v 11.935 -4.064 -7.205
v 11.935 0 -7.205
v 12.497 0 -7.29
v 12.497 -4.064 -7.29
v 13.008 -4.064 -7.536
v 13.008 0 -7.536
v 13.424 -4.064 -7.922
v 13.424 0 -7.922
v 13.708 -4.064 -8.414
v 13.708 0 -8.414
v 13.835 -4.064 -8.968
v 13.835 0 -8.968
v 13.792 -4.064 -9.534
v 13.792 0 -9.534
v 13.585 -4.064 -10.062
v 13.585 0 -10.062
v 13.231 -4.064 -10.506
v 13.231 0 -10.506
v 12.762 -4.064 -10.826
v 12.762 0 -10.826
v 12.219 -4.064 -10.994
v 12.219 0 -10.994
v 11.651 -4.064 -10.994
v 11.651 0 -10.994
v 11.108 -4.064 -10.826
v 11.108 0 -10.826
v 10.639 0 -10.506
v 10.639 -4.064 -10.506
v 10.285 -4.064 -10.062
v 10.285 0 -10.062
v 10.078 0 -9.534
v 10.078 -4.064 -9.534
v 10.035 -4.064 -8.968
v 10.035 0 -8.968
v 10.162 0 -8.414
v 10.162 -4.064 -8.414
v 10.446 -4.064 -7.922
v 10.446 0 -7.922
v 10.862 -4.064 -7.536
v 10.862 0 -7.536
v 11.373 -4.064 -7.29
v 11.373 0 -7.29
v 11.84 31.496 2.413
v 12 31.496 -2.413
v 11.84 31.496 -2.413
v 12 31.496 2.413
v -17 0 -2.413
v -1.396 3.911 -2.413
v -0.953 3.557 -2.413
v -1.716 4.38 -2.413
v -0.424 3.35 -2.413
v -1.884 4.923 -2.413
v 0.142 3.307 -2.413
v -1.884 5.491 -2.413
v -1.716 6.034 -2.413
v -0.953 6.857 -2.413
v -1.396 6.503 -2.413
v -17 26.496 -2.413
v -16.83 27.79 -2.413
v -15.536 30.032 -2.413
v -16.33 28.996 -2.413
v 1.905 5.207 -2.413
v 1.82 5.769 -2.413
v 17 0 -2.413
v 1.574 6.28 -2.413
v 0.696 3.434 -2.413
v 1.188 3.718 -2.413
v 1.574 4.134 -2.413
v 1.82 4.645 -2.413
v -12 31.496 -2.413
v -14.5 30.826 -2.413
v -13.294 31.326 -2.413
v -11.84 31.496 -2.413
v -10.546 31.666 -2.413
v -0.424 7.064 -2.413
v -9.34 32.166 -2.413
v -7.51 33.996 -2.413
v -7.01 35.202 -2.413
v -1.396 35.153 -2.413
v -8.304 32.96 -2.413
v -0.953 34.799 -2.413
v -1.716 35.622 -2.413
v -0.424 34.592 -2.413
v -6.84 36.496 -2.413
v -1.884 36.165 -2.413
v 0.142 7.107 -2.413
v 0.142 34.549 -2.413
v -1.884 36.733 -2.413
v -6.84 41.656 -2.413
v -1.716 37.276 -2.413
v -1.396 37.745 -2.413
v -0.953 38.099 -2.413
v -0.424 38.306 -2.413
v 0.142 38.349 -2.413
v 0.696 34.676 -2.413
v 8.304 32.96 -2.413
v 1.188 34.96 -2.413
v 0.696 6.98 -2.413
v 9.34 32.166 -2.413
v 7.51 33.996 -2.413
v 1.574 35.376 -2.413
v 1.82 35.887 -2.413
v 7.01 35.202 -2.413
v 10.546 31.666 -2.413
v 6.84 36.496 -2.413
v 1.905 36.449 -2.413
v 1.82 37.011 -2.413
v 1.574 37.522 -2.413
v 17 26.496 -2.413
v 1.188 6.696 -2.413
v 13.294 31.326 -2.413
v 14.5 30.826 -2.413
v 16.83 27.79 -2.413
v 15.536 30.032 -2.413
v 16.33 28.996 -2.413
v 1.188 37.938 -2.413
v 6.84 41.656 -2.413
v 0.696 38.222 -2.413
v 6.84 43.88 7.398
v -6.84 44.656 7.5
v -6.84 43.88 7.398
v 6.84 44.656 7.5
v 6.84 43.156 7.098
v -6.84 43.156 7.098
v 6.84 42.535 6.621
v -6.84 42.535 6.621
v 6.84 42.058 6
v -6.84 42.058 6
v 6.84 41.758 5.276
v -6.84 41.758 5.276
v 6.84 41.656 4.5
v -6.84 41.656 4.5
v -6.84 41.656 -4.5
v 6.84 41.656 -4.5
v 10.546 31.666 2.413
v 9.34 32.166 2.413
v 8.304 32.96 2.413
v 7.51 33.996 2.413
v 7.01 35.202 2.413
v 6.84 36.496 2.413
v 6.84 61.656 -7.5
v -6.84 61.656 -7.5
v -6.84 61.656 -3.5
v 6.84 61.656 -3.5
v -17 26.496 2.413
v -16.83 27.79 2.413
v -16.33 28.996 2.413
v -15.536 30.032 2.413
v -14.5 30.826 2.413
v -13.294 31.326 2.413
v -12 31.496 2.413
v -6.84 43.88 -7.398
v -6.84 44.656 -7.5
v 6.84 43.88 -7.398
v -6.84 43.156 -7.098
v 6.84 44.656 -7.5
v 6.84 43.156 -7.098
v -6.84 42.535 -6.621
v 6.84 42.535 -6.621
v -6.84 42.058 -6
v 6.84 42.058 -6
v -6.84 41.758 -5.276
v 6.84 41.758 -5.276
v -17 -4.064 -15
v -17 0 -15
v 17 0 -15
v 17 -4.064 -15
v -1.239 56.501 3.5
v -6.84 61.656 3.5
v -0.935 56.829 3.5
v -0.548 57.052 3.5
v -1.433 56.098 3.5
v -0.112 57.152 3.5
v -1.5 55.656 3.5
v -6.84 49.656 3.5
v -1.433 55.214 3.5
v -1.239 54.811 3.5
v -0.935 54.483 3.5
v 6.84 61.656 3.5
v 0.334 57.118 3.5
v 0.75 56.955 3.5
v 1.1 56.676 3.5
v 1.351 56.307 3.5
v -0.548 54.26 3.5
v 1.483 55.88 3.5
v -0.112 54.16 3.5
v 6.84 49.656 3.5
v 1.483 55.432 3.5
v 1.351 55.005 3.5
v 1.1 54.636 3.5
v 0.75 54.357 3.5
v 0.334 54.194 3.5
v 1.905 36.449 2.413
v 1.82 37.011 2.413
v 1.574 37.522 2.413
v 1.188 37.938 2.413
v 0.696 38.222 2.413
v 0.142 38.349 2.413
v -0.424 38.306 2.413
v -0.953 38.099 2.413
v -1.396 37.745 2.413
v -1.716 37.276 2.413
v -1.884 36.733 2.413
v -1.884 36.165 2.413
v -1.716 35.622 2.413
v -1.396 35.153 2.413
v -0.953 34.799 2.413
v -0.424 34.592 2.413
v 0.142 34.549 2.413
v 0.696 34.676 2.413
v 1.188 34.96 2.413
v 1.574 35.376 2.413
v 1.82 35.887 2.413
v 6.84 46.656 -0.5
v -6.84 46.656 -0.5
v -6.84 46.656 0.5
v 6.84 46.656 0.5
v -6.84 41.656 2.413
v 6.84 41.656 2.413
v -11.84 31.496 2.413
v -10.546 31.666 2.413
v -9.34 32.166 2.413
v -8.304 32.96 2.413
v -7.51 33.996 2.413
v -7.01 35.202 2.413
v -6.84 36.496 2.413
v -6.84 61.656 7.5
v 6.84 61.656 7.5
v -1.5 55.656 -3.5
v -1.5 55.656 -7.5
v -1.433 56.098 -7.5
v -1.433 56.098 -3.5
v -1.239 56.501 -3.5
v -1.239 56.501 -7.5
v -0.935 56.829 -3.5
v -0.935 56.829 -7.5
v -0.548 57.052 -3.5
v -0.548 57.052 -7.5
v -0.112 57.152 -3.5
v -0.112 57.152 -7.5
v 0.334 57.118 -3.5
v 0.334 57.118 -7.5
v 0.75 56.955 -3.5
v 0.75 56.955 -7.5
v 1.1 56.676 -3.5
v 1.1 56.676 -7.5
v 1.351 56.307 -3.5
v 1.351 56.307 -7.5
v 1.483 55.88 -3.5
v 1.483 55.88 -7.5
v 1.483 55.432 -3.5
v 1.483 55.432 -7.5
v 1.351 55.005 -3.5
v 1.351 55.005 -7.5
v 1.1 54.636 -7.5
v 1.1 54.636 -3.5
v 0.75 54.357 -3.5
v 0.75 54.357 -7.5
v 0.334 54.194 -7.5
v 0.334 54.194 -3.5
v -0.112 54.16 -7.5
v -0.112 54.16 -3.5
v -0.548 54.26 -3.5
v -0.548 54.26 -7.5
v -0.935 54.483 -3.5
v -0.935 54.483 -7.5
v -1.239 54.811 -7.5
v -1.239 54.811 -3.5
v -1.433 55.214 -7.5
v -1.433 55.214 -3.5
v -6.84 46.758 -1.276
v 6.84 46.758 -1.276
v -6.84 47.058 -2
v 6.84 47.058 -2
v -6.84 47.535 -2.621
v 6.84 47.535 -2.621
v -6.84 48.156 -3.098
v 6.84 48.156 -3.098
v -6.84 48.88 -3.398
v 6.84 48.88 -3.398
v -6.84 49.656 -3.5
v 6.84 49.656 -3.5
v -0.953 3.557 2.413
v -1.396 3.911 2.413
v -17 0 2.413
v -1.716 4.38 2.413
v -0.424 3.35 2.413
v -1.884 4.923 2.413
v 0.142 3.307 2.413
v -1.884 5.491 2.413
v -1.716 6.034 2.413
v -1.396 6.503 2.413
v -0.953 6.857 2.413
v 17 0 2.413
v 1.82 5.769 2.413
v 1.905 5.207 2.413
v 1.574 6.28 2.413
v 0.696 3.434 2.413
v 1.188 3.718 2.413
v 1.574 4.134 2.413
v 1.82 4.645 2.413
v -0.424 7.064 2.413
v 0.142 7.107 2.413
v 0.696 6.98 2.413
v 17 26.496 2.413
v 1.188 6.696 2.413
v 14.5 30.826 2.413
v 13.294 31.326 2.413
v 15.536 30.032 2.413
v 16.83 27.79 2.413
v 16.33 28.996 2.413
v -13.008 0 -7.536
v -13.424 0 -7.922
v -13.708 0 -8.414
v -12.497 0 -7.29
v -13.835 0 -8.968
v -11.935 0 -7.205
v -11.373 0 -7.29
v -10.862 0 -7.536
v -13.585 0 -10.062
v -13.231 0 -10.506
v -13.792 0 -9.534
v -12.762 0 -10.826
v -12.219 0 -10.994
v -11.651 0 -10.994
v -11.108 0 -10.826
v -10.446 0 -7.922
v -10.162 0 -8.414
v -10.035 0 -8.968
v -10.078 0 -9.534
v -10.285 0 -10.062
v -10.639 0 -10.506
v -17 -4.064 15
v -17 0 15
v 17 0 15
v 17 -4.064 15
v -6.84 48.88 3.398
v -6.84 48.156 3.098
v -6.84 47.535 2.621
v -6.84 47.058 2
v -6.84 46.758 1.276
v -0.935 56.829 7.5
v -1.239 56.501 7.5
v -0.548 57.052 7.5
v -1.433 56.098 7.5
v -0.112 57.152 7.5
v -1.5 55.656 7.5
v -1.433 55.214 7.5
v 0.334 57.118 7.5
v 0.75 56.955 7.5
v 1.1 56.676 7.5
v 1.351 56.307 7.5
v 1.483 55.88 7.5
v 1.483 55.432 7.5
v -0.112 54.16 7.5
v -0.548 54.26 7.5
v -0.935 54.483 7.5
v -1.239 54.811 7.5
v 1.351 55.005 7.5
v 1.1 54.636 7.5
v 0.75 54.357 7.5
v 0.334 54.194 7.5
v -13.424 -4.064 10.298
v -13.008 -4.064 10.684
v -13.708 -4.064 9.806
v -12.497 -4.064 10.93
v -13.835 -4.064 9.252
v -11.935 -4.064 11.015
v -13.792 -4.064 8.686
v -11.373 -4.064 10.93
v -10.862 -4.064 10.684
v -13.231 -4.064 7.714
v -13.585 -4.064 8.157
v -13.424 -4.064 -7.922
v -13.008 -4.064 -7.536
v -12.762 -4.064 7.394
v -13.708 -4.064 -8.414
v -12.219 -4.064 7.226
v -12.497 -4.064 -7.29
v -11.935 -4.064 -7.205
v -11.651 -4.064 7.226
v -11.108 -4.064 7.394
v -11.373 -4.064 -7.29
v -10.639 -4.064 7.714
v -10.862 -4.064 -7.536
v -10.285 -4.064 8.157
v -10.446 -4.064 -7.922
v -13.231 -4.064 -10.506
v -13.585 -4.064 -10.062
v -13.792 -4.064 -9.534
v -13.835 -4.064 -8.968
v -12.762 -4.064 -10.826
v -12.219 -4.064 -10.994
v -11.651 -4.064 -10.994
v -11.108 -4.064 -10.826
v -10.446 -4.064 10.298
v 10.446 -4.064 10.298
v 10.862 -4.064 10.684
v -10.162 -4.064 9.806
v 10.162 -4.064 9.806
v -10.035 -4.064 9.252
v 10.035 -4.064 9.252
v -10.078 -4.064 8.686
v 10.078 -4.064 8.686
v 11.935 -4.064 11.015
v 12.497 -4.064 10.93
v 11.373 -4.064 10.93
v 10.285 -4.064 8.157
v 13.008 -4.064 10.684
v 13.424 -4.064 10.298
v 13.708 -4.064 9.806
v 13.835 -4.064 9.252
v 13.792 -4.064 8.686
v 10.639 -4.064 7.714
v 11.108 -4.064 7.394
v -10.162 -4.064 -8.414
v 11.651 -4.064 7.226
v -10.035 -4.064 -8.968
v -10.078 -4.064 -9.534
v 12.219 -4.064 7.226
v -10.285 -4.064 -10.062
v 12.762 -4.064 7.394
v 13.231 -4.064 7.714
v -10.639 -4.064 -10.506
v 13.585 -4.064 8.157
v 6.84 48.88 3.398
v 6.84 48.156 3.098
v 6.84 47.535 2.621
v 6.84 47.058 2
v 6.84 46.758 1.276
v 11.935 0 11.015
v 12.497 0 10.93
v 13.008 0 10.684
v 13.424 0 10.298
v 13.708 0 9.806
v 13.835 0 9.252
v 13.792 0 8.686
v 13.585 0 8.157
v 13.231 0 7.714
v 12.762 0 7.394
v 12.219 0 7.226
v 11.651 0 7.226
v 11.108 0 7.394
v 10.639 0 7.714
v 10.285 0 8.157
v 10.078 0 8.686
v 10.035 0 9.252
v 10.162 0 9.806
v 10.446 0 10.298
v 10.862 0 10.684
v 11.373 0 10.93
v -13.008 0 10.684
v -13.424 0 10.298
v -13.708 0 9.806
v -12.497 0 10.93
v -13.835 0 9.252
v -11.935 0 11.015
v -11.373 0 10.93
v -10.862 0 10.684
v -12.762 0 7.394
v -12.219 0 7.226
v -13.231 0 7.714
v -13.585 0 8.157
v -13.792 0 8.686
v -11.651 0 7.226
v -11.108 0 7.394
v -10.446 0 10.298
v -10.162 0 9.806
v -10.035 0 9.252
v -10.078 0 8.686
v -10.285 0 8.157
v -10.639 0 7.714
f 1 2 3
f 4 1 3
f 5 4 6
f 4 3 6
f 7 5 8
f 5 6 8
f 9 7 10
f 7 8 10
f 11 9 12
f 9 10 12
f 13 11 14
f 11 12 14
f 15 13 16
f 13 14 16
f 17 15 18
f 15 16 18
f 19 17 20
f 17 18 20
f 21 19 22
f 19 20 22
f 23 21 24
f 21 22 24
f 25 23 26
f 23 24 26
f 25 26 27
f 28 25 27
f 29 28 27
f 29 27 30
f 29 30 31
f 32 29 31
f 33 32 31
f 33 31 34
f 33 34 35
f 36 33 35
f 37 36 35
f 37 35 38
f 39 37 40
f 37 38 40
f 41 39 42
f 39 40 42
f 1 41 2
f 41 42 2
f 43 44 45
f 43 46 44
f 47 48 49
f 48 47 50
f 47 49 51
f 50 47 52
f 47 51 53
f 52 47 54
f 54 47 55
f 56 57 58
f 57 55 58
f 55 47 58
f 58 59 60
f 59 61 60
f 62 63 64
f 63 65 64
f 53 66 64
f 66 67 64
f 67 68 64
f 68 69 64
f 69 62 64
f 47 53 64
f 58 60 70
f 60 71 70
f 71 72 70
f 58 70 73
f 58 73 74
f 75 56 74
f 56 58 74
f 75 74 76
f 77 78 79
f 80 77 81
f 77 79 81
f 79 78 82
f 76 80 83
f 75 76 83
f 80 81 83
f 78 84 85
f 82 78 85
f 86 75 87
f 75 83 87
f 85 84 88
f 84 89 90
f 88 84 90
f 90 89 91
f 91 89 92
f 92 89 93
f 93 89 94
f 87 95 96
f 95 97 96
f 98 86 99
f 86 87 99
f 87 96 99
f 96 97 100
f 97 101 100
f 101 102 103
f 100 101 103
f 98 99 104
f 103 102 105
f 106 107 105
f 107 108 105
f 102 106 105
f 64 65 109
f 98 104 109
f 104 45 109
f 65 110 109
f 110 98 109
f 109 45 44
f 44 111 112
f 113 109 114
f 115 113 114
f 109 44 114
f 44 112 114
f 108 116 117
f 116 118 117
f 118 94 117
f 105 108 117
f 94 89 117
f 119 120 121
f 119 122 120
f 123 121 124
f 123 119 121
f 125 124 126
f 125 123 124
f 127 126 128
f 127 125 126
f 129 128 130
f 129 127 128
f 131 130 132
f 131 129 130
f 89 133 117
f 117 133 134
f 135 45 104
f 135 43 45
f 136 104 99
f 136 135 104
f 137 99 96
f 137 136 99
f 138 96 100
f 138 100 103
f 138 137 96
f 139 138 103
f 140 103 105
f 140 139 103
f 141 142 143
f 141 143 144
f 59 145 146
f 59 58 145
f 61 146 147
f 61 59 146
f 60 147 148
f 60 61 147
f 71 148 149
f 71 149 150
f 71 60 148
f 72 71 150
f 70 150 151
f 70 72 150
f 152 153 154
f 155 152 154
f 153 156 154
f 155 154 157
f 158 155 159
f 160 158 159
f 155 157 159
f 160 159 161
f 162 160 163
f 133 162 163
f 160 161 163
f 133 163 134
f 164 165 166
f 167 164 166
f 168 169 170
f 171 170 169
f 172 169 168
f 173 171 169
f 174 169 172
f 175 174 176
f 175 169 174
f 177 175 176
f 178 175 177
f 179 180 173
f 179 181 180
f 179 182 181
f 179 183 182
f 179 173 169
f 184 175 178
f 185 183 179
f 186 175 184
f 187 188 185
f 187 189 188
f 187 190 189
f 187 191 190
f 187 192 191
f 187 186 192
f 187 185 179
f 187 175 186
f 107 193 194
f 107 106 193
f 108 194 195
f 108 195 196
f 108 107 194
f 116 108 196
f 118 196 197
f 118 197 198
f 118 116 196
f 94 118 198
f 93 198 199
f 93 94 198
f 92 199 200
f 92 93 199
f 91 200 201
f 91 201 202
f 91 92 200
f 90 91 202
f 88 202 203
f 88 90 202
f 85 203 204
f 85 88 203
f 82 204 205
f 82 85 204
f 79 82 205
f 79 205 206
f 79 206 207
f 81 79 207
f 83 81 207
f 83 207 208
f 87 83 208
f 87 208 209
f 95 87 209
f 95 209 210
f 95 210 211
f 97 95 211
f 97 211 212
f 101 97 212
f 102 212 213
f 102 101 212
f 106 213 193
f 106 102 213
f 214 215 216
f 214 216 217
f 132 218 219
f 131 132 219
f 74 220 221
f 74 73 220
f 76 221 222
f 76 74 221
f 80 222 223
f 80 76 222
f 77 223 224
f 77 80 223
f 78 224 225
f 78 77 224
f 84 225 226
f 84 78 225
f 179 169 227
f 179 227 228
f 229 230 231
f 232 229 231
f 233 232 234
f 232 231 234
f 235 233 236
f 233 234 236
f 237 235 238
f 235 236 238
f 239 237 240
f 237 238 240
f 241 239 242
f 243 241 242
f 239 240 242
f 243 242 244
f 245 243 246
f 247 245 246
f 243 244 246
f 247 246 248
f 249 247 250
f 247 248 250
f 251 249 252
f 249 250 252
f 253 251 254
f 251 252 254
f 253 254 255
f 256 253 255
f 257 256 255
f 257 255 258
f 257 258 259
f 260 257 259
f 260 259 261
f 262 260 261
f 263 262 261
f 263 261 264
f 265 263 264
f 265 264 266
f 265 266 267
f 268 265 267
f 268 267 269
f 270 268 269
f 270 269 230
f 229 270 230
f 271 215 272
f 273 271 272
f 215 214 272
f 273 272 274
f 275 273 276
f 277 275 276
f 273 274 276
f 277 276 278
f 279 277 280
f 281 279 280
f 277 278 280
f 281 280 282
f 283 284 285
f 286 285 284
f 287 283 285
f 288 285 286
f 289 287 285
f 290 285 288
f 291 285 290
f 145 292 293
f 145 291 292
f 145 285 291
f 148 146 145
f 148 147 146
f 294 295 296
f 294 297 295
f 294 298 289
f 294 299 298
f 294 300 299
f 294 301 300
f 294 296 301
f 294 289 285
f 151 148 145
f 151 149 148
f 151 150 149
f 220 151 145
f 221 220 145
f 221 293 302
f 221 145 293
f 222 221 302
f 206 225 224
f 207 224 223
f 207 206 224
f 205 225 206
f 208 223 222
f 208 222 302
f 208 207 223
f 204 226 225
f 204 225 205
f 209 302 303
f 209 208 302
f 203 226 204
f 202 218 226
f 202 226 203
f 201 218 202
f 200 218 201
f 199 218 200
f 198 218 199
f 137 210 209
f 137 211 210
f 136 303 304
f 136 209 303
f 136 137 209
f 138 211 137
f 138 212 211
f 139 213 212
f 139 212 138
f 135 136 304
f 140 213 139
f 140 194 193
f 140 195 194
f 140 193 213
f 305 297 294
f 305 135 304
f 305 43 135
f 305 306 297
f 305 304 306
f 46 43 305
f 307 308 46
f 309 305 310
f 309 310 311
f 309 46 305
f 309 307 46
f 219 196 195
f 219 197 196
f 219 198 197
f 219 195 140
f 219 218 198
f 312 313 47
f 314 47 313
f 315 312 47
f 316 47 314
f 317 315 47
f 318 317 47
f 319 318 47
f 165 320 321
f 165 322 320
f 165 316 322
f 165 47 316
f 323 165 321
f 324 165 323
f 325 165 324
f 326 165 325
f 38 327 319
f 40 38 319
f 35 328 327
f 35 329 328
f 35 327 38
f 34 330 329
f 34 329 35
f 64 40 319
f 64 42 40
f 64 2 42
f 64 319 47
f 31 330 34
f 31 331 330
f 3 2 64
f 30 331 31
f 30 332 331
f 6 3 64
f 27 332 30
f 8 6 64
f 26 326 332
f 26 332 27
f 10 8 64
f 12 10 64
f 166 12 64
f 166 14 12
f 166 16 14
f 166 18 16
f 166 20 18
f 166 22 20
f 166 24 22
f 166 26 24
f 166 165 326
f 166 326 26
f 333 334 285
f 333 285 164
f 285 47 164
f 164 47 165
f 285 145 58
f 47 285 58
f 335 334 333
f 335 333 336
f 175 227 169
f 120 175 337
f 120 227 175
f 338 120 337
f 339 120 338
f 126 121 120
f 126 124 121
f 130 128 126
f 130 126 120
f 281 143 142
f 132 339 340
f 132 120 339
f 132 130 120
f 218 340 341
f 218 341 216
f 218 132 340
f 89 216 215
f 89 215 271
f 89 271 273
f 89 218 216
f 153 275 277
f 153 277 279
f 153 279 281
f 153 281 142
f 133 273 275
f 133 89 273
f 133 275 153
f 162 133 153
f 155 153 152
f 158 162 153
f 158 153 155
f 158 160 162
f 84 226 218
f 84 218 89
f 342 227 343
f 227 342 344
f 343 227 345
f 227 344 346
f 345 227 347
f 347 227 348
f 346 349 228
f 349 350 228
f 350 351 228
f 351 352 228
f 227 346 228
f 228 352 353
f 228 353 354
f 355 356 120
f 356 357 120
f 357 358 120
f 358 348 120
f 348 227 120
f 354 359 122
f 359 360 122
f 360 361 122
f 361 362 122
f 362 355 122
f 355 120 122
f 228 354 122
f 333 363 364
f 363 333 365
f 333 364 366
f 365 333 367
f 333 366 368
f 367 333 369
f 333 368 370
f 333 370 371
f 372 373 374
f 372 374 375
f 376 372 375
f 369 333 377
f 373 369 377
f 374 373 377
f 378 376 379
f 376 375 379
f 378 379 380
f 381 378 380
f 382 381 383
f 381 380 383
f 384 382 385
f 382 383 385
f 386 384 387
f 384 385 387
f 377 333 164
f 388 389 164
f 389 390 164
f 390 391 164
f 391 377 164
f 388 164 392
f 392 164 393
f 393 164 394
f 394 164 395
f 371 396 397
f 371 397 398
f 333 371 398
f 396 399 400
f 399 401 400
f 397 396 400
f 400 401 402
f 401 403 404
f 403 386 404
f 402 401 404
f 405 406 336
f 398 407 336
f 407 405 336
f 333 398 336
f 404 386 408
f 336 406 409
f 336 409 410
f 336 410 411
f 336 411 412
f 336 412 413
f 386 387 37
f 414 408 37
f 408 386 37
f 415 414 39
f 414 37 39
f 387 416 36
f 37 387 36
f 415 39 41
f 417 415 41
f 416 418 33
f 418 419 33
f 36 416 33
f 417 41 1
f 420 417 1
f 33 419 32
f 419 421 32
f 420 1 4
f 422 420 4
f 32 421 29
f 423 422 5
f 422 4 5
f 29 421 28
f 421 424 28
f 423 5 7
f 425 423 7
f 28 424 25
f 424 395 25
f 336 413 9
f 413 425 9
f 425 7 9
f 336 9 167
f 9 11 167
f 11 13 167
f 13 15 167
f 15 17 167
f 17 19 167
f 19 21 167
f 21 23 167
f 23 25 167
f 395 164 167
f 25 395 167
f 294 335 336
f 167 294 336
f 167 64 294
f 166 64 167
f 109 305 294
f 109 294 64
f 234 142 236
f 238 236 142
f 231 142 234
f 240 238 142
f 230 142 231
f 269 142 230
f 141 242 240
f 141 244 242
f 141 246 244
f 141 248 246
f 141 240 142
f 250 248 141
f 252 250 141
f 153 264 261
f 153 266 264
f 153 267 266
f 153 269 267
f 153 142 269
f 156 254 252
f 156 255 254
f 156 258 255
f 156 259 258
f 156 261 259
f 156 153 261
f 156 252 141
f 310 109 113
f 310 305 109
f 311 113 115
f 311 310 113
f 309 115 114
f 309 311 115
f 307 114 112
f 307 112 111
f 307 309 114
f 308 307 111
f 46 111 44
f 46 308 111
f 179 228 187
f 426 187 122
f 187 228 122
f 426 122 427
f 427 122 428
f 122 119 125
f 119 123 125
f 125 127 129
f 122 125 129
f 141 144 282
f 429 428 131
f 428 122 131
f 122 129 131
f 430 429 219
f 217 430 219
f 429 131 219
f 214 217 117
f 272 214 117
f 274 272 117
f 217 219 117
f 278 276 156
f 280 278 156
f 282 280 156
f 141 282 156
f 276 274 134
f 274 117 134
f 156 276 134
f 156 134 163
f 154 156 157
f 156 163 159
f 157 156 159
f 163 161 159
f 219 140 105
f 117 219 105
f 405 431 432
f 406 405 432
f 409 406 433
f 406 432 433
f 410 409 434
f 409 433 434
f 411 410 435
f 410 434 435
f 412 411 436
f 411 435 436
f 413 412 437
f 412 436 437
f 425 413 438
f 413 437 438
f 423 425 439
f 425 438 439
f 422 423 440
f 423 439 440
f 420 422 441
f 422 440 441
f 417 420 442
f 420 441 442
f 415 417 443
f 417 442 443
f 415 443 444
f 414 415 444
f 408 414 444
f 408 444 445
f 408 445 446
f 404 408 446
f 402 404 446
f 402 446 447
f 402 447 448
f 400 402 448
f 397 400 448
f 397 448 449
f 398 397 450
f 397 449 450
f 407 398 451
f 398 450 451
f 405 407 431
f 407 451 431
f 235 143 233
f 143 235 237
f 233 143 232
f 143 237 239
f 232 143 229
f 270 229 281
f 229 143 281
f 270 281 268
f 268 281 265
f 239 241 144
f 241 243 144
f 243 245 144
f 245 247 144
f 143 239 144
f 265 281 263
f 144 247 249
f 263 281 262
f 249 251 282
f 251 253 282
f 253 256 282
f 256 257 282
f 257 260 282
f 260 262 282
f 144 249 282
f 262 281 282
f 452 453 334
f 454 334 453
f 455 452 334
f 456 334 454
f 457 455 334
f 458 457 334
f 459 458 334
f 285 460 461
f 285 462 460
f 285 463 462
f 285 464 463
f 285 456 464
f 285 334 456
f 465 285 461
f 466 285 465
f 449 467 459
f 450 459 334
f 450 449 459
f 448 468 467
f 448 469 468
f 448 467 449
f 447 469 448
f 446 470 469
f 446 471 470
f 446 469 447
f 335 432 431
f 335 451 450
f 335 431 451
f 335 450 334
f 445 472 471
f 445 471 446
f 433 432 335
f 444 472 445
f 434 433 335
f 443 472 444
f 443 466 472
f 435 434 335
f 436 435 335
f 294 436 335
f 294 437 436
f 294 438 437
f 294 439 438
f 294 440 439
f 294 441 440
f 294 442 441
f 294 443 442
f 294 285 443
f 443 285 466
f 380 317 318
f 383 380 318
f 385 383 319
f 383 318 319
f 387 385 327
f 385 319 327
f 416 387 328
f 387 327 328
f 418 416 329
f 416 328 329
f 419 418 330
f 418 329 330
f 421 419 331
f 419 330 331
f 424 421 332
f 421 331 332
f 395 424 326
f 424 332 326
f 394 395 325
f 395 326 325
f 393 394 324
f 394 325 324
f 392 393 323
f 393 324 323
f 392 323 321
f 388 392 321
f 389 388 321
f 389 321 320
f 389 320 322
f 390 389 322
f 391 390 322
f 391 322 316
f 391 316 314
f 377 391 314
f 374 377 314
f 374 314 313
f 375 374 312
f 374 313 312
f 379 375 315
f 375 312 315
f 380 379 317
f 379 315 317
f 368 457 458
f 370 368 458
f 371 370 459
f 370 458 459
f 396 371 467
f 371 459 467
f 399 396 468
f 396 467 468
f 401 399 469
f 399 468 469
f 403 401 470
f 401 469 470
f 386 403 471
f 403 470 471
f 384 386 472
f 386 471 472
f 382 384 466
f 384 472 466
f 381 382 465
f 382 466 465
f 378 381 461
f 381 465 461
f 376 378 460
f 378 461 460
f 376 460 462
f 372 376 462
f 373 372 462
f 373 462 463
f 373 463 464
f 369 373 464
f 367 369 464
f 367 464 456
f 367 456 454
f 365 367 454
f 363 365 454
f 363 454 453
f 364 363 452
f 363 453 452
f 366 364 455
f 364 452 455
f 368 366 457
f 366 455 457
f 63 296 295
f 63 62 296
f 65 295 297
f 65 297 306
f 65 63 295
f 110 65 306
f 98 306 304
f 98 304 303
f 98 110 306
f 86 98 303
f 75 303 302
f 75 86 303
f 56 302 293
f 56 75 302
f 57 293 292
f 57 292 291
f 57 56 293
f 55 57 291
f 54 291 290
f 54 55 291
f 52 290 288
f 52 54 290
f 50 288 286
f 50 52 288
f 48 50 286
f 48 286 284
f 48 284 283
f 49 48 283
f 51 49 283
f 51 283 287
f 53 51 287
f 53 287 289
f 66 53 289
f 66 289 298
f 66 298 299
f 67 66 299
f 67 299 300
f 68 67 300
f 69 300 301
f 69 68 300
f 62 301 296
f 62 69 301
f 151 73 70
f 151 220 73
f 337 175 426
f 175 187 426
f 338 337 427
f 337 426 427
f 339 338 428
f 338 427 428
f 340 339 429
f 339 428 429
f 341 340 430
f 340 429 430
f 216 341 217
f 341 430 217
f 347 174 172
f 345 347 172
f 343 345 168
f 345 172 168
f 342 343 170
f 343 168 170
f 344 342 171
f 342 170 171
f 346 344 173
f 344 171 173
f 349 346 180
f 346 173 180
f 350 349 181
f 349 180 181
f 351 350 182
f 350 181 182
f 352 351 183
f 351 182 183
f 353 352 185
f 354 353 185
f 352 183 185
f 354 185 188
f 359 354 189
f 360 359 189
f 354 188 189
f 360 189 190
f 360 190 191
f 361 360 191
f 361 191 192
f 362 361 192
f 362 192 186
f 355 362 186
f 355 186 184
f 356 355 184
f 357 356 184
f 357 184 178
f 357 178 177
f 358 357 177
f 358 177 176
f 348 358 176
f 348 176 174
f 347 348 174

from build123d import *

# Parameters (mm, degrees)
SKETCH1_R           = 1.905
BOSS_EXTRUDE1_DEPTH = 2.413
SKETCH3_W           = 34
SKETCH3_H           = 30
SKETCH3_R           = 1.905
BOSS_EXTRUDE2_DEPTH = 4.064
FILLET1_R           = 5
SKETCH5_W           = 13.68
SKETCH5_H           = 4.826
SKETCH5_H_2         = 1.087
BOSS_EXTRUDE4_DEPTH = 5
SKETCH5_3_W         = 13.68
SKETCH5_3_H         = 4
BOSS_EXTRUDE5_DEPTH = 20
CUT_EXTRUDE1_REACH  = 69.799
SKETCH6_R           = 1.5
FILLET2_R           = 3


with BuildPart() as part:
    # Sketch1 → Boss-Extrude1 (new, symmetric)
    # profile 1 of 2: a face of its own
    with BuildSketch(Plane.XY):
        Polygon((-17, 31.496), (-17, 0), (17, 0), (17, 31.496), (6.84, 31.496), (6.84, 41.656), (-6.84, 41.656), (-6.84, 31.496), align=None)
        with Locations((0, 5.207)):
            Circle(SKETCH1_R, mode=Mode.SUBTRACT)
        with Locations((0, 36.449)):
            Circle(SKETCH1_R, mode=Mode.SUBTRACT)
    # profile 2 of 2: a face of its own
    with BuildSketch(Plane.XY):
        Polygon((-17, 31.496), (-17, 0), (17, 0), (17, 31.496), (6.84, 31.496), (6.84, 41.656), (-6.84, 41.656), (-6.84, 31.496), align=None)
        with Locations((0, 5.207)):
            Circle(SKETCH1_R, mode=Mode.SUBTRACT)
        with Locations((0, 36.449)):
            Circle(SKETCH1_R, mode=Mode.SUBTRACT)
    extrude(amount=BOSS_EXTRUDE1_DEPTH, both=True)

    # Sketch3 → Boss-Extrude2 (add)
    with BuildSketch(Plane(origin=(0, 0, 0), x_dir=(1, 0, 0), z_dir=(0, 1, 0))):
        Rectangle(SKETCH3_W, SKETCH3_H)
        with Locations(Location((-11.935, -9.11, 0), (0, 0, 270))):
            Circle(SKETCH3_R, mode=Mode.SUBTRACT)
        with Locations(Location((11.935, -9.11, 0), (0, 0, 270))):
            Circle(SKETCH3_R, mode=Mode.SUBTRACT)
        with Locations(Location((11.935, 9.11, 0), (0, 0, 270))):
            Circle(SKETCH3_R, mode=Mode.SUBTRACT)
        with Locations(Location((-11.935, 9.11, 0), (0, 0, 270))):
            Circle(SKETCH3_R, mode=Mode.SUBTRACT)
    extrude(amount=-BOSS_EXTRUDE2_DEPTH)

    # Fillet1
    fillet1_edges = [part.edges().sort_by_distance(p)[0] for p in [
        (6.84, 31.496, 0),
        (17, 31.496, 0),
        (-17, 31.496, 0),
        (-6.84, 31.496, 0),
    ]]
    fillet(fillet1_edges, radius=FILLET1_R)

    # Sketch5 → Boss-Extrude4 (add)
    with BuildSketch(Plane(origin=(0, 41.656, 0), x_dir=(1, 0, 0), z_dir=(0, 1, 0))):
        Rectangle(SKETCH5_W, SKETCH5_H)
        with Locations((0, -2.9565)):
            Rectangle(SKETCH5_W, SKETCH5_H_2)
        with Locations((0, 2.9565)):
            Rectangle(SKETCH5_W, SKETCH5_H_2)
    extrude(amount=BOSS_EXTRUDE4_DEPTH)

    # Sketch5<3> → Boss-Extrude5 (add)
    with BuildSketch(Plane(origin=(0, 41.656, 0), x_dir=(1, 0, 0), z_dir=(0, 1, 0))):
        with Locations((0, -5.5)):
            Rectangle(SKETCH5_3_W, SKETCH5_3_H)
        with Locations((0, 5.5)):
            Rectangle(SKETCH5_3_W, SKETCH5_3_H)
    extrude(amount=BOSS_EXTRUDE5_DEPTH)

    # Cut-Extrude1: up to this face of the body (flat: up to its plane)
    cut_extrude1_end = Plane(part.part.faces().sort_by_distance((0, 51.656, 7.5))[0])
    # Sketch6 → Cut-Extrude1 (cut, up to the picked face)
    with BuildSketch(Plane(origin=(0, 0, -7.5), x_dir=(-1, 0, 0), z_dir=(0, 0, -1)), mode=Mode.PRIVATE) as cut_extrude1_sk1:
        with Locations((0, 55.656)):
            Circle(SKETCH6_R)
    cut_extrude1_tool1 = split(extrude(cut_extrude1_sk1.sketch, amount=-CUT_EXTRUDE1_REACH, mode=Mode.PRIVATE), bisect_by=cut_extrude1_end, keep=Keep.BOTH, mode=Mode.PRIVATE)
    add(cut_extrude1_tool1.solids().sort_by(Axis((0, 55.656, -7.5), (0, 0, 1)))[0], mode=Mode.SUBTRACT)

    # Fillet2
    fillet2_edges = [part.edges().sort_by_distance(p)[0] for p in [
        (0, 41.656, -7.5),
        (0, 46.656, -3.5),
        (0, 46.656, 3.5),
        (0, 41.656, 7.5),
    ]]
    fillet(fillet2_edges, radius=FILLET2_R)


solid = part.part
